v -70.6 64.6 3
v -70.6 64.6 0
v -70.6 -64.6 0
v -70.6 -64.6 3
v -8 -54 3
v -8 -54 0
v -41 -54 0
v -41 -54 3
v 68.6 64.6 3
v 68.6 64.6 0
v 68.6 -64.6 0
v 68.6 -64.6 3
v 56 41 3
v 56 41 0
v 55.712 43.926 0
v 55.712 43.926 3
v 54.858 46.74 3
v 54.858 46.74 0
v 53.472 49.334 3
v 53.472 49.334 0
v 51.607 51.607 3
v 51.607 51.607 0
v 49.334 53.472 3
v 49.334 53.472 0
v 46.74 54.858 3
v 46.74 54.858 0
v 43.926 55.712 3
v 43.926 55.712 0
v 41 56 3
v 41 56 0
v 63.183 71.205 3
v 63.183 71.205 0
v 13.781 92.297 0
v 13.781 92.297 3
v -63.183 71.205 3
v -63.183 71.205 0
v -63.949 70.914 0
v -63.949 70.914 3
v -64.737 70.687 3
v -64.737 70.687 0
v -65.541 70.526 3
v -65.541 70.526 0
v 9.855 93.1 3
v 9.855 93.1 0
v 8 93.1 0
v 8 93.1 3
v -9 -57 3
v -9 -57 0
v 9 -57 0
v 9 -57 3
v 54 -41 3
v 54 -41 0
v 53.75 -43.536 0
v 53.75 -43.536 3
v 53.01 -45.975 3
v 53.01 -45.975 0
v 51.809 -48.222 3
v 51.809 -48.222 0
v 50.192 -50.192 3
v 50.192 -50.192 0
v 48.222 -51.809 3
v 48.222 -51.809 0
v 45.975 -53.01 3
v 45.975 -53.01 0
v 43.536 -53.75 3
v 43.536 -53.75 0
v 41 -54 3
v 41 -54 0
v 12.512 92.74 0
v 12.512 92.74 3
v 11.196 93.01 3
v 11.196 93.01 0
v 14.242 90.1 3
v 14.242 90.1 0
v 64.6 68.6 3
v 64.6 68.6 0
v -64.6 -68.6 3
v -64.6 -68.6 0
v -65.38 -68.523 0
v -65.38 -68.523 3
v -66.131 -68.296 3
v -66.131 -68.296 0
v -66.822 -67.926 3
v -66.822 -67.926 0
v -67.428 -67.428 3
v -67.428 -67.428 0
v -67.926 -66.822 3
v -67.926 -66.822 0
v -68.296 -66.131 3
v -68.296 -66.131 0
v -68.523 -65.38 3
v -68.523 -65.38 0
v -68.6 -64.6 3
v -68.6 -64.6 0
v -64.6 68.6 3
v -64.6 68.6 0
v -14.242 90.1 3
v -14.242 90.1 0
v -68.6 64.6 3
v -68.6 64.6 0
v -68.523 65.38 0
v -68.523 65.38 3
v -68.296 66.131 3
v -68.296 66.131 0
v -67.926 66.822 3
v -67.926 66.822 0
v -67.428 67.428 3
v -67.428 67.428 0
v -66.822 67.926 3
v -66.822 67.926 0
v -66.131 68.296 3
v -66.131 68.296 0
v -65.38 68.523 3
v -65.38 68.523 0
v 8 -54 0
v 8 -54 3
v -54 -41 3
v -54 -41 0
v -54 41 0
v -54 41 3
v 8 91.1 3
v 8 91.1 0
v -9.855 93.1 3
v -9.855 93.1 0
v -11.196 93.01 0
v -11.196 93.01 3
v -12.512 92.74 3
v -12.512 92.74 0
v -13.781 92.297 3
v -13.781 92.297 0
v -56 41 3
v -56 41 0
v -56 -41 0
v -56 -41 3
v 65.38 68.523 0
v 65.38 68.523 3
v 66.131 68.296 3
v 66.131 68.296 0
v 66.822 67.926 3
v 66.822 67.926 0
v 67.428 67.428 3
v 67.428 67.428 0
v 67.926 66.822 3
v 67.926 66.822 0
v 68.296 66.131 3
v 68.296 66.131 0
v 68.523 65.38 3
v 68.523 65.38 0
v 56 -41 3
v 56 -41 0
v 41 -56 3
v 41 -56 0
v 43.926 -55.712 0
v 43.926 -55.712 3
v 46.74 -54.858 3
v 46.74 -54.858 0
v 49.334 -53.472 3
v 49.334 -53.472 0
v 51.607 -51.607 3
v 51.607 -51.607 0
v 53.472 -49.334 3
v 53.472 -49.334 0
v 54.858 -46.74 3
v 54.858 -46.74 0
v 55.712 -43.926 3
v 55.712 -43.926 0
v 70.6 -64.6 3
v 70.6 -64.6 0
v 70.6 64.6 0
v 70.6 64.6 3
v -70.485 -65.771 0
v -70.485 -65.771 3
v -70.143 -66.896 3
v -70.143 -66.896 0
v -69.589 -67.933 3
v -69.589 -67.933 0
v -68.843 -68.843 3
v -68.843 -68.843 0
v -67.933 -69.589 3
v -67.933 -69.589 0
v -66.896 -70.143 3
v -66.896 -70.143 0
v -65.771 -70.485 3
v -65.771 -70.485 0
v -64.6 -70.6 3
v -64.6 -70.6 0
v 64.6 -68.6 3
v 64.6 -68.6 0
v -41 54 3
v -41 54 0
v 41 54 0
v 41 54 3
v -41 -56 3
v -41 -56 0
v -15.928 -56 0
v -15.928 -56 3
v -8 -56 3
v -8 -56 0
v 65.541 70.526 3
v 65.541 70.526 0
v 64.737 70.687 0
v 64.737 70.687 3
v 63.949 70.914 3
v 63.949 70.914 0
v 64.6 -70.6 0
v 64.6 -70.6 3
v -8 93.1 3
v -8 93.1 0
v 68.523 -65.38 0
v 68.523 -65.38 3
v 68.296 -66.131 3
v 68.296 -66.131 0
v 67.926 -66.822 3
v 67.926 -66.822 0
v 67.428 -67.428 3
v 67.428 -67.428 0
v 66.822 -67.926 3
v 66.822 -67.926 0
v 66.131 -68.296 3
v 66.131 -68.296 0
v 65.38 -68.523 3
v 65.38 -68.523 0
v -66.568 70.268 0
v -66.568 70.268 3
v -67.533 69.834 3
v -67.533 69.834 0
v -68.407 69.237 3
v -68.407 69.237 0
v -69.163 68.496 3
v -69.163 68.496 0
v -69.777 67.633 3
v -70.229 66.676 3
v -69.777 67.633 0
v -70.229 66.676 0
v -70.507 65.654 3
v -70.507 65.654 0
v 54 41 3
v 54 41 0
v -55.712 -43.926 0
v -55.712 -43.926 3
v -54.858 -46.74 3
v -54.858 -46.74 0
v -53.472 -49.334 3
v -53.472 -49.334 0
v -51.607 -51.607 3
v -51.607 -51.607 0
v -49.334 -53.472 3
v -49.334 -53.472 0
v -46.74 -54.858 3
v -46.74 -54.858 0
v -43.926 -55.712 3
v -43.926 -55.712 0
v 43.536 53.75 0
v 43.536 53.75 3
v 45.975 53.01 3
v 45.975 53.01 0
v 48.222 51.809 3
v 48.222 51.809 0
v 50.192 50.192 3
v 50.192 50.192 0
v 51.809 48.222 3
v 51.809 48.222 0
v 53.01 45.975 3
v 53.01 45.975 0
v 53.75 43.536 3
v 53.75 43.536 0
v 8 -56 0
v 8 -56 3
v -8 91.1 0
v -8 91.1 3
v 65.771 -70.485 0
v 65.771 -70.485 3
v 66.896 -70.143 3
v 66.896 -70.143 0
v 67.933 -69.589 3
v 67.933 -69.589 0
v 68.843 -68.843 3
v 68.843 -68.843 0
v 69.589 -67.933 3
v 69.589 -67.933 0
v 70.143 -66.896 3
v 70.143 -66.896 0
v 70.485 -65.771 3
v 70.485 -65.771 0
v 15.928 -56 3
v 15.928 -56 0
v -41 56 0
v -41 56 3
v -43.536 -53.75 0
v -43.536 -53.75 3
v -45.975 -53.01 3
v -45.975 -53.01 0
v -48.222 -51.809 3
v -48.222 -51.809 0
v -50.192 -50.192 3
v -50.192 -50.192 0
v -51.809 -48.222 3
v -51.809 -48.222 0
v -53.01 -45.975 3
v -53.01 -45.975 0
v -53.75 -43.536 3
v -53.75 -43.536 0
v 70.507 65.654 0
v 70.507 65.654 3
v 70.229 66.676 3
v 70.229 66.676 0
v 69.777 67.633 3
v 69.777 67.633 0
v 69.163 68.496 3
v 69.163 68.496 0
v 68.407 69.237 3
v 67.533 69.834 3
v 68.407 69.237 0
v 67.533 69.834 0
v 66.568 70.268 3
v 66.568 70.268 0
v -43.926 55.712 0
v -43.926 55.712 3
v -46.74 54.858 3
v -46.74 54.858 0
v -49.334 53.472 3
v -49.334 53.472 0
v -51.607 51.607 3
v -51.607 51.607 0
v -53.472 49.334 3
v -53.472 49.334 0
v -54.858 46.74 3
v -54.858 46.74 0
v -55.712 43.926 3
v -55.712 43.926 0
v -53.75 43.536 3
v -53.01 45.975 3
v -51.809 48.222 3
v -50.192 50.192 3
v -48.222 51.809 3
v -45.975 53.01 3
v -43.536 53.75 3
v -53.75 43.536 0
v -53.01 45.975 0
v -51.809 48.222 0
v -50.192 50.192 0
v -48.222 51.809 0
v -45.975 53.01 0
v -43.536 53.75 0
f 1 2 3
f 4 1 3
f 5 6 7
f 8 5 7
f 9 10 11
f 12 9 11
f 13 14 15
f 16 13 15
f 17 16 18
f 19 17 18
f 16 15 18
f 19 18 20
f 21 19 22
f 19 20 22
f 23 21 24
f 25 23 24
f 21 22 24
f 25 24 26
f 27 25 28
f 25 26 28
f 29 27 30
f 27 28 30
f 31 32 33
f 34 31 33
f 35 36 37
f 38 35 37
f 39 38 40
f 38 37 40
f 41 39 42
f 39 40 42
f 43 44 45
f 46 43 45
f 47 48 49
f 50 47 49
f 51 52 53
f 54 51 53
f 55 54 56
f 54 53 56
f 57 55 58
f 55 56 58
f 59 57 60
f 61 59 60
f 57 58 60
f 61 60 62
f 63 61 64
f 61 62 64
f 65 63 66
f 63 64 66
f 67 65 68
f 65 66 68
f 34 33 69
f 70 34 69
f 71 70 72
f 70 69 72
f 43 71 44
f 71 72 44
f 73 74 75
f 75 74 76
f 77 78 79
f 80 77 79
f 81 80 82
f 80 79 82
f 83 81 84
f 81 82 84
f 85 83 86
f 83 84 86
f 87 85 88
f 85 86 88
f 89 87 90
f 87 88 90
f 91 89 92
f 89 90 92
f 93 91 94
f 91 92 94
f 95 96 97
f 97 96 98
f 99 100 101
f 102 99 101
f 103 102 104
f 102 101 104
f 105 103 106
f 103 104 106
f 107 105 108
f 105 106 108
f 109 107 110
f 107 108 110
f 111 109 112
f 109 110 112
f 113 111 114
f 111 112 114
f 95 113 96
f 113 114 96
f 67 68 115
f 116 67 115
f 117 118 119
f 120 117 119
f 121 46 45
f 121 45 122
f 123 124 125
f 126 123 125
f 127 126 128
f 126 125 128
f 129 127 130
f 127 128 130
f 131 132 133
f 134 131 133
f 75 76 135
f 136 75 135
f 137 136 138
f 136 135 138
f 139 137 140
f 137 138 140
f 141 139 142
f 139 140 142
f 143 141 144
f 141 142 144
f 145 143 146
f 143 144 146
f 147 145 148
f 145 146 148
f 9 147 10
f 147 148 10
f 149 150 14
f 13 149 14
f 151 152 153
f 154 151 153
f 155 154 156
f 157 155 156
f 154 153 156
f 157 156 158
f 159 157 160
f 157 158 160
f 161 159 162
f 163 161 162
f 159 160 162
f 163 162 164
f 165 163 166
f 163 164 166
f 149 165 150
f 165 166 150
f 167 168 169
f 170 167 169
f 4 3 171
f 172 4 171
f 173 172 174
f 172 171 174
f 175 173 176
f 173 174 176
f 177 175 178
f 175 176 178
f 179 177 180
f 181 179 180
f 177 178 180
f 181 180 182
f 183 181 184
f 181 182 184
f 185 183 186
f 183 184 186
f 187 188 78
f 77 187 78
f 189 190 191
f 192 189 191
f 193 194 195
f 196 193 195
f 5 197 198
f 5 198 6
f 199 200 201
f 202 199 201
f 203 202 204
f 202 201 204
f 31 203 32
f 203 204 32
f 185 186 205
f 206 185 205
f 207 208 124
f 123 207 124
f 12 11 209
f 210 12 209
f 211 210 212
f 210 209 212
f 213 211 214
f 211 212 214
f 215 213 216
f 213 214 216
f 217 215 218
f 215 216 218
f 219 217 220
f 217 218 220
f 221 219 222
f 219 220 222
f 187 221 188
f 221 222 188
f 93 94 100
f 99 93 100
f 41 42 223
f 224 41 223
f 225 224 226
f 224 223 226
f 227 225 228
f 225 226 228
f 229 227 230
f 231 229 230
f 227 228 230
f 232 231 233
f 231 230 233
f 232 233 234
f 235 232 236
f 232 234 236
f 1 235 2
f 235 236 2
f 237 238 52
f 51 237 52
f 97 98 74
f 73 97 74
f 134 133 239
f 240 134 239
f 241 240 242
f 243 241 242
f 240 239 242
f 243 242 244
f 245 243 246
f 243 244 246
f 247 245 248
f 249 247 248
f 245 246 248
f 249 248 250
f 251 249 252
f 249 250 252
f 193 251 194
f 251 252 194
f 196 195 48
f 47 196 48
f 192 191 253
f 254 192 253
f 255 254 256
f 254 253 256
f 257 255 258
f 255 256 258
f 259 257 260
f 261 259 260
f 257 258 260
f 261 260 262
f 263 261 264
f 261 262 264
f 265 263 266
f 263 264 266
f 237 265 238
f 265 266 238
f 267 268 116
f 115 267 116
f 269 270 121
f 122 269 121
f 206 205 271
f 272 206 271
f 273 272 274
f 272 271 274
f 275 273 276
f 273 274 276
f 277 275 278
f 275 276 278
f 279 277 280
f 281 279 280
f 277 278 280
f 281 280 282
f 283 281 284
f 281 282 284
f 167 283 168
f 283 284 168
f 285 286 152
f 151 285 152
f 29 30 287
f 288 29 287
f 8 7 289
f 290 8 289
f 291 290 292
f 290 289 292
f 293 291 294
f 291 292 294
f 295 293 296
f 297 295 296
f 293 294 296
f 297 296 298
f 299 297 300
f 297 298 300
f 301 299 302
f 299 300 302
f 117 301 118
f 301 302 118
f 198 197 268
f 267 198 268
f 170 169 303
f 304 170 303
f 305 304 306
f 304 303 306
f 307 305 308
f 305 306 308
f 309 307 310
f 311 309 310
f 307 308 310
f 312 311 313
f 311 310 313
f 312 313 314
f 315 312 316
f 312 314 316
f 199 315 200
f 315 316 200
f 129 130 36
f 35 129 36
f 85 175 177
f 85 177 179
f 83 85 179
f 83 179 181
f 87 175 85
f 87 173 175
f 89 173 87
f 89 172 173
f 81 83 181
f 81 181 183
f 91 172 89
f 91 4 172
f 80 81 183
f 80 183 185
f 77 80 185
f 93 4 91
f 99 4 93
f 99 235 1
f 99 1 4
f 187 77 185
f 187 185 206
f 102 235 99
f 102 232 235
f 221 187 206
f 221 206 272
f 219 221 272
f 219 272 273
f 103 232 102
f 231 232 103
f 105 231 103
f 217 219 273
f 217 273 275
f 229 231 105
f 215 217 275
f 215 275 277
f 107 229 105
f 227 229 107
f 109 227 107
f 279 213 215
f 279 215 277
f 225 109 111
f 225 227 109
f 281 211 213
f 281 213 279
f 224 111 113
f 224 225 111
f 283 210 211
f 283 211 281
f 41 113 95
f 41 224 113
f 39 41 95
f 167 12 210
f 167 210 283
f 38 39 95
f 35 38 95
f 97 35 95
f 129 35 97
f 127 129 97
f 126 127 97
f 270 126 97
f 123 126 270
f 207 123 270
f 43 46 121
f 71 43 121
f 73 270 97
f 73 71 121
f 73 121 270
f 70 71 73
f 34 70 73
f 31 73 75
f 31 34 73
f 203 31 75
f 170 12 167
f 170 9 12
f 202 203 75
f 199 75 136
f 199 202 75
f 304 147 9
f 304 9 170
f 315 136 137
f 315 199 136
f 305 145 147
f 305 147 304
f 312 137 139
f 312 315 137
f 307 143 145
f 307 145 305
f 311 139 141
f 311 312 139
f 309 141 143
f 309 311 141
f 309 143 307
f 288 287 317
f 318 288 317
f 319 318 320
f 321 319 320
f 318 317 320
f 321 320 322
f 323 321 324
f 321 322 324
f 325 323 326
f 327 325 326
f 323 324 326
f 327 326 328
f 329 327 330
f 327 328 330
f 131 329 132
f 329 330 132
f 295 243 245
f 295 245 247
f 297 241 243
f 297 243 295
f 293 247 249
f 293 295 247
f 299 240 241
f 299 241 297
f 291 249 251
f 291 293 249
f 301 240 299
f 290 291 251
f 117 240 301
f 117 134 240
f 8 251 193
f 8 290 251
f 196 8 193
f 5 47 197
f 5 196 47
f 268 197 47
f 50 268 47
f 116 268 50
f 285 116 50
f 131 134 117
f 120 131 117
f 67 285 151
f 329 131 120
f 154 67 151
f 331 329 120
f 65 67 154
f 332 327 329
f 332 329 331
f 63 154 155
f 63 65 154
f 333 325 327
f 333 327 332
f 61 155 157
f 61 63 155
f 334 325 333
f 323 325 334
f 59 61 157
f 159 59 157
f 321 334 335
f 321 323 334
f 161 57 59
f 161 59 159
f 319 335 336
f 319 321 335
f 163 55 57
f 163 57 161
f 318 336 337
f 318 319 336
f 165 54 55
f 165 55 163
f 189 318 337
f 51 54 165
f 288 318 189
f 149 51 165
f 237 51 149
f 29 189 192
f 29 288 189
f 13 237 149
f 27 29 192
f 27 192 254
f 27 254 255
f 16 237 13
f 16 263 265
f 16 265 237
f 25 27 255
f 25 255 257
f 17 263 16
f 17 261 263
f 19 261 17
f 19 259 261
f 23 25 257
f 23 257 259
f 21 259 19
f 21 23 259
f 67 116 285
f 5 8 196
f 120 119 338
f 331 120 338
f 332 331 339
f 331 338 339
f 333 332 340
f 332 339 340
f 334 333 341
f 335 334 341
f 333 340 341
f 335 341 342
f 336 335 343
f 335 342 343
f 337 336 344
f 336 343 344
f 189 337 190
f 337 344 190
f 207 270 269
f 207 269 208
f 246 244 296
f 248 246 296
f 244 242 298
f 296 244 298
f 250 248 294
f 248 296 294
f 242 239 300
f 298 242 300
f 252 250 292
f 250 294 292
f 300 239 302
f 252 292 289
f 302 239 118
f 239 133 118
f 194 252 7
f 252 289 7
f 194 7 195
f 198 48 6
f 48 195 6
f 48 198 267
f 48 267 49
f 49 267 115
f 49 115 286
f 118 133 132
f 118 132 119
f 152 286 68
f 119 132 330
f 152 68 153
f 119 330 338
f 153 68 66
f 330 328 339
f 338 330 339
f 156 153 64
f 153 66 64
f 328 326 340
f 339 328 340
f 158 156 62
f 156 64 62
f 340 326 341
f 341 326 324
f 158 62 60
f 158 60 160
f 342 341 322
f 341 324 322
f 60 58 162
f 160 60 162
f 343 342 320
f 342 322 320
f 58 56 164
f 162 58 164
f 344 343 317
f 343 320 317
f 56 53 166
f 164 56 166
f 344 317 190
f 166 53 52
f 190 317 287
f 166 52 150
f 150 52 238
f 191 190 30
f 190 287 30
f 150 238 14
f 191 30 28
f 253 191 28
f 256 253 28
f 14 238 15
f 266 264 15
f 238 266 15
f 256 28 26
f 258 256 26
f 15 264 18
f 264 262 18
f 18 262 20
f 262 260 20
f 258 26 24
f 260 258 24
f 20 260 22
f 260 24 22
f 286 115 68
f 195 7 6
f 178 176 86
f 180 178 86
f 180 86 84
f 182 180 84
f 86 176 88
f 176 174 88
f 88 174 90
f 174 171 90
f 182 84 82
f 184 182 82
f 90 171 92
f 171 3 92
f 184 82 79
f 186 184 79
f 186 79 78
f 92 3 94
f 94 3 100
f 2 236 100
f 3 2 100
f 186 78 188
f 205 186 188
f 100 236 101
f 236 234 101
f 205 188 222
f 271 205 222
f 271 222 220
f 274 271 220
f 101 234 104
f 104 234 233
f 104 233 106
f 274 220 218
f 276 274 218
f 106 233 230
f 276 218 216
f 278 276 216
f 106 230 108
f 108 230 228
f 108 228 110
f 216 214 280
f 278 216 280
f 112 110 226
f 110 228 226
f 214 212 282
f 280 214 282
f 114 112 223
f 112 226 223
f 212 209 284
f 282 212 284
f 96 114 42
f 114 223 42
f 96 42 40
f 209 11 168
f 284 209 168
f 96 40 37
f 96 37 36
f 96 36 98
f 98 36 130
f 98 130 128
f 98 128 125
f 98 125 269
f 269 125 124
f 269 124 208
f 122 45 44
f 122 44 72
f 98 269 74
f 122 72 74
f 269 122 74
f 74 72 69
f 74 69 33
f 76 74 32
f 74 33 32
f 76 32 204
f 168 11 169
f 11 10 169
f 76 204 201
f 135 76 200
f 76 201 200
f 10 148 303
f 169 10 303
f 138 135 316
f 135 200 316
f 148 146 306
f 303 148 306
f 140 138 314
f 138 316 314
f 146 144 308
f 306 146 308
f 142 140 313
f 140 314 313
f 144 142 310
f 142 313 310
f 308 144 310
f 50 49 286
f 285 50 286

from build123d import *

# Parameters (mm, degrees)
BOSS_EXTRUDE1_DEPTH   = 3
BOSS_EXTRUDE1_2_DEPTH = 3
CUT_EXTRUDE1_DEPTH    = 117.880152293
SKETCH4_W             = 16
SKETCH4_H             = 2
CUT_EXTRUDE2_DEPTH    = 117.880152293


with BuildPart() as part:
    # Sketch2 → Boss-Extrude1 (new body)
    with BuildSketch(Plane.XY):
        with BuildLine():
            Line((-9, -57), (0, -57))
            Line((0, -57), (9, -57))
            Line((9, -57), (15.92820323, -56))
            Line((15.92820323, -56), (41, -56))
            ThreePointArc((41, -56), (51.606601718, -51.606601718), (56, -41))
            Line((56, -41), (56, 41))
            ThreePointArc((56, 41), (51.606601718, 51.606601718), (41, 56))
            Line((41, 56), (-41, 56))
            ThreePointArc((-41, 56), (-51.606601718, 51.606601718), (-56, 41))
            Line((-56, 41), (-56, -41))
            ThreePointArc((-56, -41), (-51.606601718, -51.606601718), (-41, -56))
            Line((-41, -56), (-15.92820323, -56))
            Line((-15.92820323, -56), (-9, -57))
        make_face()
        with BuildLine():
            Line((41, -54), (-41, -54))
            ThreePointArc((-41, -54), (-50.192388155, -50.192388155), (-54, -41))
            Line((-54, -41), (-54, 41))
            ThreePointArc((-54, 41), (-50.192388155, 50.192388155), (-41, 54))
            Line((-41, 54), (41, 54))
            ThreePointArc((41, 54), (50.192388155, 50.192388155), (54, 41))
            Line((54, 41), (54, -41))
            ThreePointArc((54, -41), (50.192388155, -50.192388155), (41, -54))
        make_face(mode=Mode.SUBTRACT)
    extrude(amount=BOSS_EXTRUDE1_DEPTH)

    # Sketch4 → Cut-Extrude2 (cut, through all)
    with BuildSketch(Plane.XY.offset(3)):
        with Locations((0, -55)):
            Rectangle(SKETCH4_W, SKETCH4_H)
    extrude(amount=-CUT_EXTRUDE2_DEPTH, mode=Mode.SUBTRACT)


with BuildPart() as body_2:
    # Sketch2 → Boss-Extrude1 2 (new body)
    with BuildSketch(Plane.XY):
        with BuildLine():
            ThreePointArc((-65.540902989, 70.525765905), (-69.163190657, 68.495804286), (-70.6, 64.6))
            Line((-70.6, 64.6), (-70.6, -64.6))
            ThreePointArc((-70.6, -64.6), (-68.842640687, -68.842640687), (-64.6, -70.6))
            Line((-64.6, -70.6), (64.6, -70.6))
            ThreePointArc((64.6, -70.6), (68.842640687, -68.842640687), (70.6, -64.6))
            Line((70.6, -64.6), (70.6, 64.6))
            ThreePointArc((70.6, 64.6), (69.163190657, 68.495804286), (65.540902989, 70.525765905))
            ThreePointArc((65.540902989, 70.525765905), (64.340790015, 70.792848887), (63.182522555, 71.205184867))
            Line((63.182522555, 71.205184867), (13.781138102, 92.296857547))
            ThreePointArc((13.781138102, 92.296857547), (11.858510235, 92.897157125), (9.854586018, 93.1))
            Line((9.854586018, 93.1), (-9.854586018, 93.1))
            ThreePointArc((-9.854586018, 93.1), (-11.858510235, 92.897157125), (-13.781138102, 92.296857547))
            Line((-13.781138102, 92.296857547), (-63.182522555, 71.205184867))
            ThreePointArc((-63.182522555, 71.205184867), (-64.340790015, 70.792848887), (-65.540902989, 70.525765905))
        make_face()
        with BuildLine():
            Line((-64.6, 68.6), (-14.242222222, 90.1))
            Line((-14.242222222, 90.1), (14.242222222, 90.1))
            Line((14.242222222, 90.1), (64.6, 68.6))
            ThreePointArc((64.6, 68.6), (67.428427125, 67.428427125), (68.6, 64.6))
            Line((68.6, 64.6), (68.6, -64.6))
            ThreePointArc((68.6, -64.6), (67.428427125, -67.428427125), (64.6, -68.6))
            Line((64.6, -68.6), (-64.6, -68.6))
            ThreePointArc((-64.6, -68.6), (-67.428427125, -67.428427125), (-68.6, -64.6))
            Line((-68.6, -64.6), (-68.6, 64.6))
            ThreePointArc((-68.6, 64.6), (-67.428427125, 67.428427125), (-64.6, 68.6))
        make_face(mode=Mode.SUBTRACT)
    extrude(amount=BOSS_EXTRUDE1_2_DEPTH)

    # Sketch3 → Cut-Extrude1 (cut, through all)
    with BuildSketch(Plane.XY.offset(3)):
        Polygon((-6, 93.1), (6, 93.1), (8, 93.1), (8, 91.1), (6, 91.1), (-6, 91.1), (-8, 91.1), (-8, 93.1), align=None)
    extrude(amount=-CUT_EXTRUDE1_DEPTH, mode=Mode.SUBTRACT)


solid = Compound([part.part, body_2.part])
